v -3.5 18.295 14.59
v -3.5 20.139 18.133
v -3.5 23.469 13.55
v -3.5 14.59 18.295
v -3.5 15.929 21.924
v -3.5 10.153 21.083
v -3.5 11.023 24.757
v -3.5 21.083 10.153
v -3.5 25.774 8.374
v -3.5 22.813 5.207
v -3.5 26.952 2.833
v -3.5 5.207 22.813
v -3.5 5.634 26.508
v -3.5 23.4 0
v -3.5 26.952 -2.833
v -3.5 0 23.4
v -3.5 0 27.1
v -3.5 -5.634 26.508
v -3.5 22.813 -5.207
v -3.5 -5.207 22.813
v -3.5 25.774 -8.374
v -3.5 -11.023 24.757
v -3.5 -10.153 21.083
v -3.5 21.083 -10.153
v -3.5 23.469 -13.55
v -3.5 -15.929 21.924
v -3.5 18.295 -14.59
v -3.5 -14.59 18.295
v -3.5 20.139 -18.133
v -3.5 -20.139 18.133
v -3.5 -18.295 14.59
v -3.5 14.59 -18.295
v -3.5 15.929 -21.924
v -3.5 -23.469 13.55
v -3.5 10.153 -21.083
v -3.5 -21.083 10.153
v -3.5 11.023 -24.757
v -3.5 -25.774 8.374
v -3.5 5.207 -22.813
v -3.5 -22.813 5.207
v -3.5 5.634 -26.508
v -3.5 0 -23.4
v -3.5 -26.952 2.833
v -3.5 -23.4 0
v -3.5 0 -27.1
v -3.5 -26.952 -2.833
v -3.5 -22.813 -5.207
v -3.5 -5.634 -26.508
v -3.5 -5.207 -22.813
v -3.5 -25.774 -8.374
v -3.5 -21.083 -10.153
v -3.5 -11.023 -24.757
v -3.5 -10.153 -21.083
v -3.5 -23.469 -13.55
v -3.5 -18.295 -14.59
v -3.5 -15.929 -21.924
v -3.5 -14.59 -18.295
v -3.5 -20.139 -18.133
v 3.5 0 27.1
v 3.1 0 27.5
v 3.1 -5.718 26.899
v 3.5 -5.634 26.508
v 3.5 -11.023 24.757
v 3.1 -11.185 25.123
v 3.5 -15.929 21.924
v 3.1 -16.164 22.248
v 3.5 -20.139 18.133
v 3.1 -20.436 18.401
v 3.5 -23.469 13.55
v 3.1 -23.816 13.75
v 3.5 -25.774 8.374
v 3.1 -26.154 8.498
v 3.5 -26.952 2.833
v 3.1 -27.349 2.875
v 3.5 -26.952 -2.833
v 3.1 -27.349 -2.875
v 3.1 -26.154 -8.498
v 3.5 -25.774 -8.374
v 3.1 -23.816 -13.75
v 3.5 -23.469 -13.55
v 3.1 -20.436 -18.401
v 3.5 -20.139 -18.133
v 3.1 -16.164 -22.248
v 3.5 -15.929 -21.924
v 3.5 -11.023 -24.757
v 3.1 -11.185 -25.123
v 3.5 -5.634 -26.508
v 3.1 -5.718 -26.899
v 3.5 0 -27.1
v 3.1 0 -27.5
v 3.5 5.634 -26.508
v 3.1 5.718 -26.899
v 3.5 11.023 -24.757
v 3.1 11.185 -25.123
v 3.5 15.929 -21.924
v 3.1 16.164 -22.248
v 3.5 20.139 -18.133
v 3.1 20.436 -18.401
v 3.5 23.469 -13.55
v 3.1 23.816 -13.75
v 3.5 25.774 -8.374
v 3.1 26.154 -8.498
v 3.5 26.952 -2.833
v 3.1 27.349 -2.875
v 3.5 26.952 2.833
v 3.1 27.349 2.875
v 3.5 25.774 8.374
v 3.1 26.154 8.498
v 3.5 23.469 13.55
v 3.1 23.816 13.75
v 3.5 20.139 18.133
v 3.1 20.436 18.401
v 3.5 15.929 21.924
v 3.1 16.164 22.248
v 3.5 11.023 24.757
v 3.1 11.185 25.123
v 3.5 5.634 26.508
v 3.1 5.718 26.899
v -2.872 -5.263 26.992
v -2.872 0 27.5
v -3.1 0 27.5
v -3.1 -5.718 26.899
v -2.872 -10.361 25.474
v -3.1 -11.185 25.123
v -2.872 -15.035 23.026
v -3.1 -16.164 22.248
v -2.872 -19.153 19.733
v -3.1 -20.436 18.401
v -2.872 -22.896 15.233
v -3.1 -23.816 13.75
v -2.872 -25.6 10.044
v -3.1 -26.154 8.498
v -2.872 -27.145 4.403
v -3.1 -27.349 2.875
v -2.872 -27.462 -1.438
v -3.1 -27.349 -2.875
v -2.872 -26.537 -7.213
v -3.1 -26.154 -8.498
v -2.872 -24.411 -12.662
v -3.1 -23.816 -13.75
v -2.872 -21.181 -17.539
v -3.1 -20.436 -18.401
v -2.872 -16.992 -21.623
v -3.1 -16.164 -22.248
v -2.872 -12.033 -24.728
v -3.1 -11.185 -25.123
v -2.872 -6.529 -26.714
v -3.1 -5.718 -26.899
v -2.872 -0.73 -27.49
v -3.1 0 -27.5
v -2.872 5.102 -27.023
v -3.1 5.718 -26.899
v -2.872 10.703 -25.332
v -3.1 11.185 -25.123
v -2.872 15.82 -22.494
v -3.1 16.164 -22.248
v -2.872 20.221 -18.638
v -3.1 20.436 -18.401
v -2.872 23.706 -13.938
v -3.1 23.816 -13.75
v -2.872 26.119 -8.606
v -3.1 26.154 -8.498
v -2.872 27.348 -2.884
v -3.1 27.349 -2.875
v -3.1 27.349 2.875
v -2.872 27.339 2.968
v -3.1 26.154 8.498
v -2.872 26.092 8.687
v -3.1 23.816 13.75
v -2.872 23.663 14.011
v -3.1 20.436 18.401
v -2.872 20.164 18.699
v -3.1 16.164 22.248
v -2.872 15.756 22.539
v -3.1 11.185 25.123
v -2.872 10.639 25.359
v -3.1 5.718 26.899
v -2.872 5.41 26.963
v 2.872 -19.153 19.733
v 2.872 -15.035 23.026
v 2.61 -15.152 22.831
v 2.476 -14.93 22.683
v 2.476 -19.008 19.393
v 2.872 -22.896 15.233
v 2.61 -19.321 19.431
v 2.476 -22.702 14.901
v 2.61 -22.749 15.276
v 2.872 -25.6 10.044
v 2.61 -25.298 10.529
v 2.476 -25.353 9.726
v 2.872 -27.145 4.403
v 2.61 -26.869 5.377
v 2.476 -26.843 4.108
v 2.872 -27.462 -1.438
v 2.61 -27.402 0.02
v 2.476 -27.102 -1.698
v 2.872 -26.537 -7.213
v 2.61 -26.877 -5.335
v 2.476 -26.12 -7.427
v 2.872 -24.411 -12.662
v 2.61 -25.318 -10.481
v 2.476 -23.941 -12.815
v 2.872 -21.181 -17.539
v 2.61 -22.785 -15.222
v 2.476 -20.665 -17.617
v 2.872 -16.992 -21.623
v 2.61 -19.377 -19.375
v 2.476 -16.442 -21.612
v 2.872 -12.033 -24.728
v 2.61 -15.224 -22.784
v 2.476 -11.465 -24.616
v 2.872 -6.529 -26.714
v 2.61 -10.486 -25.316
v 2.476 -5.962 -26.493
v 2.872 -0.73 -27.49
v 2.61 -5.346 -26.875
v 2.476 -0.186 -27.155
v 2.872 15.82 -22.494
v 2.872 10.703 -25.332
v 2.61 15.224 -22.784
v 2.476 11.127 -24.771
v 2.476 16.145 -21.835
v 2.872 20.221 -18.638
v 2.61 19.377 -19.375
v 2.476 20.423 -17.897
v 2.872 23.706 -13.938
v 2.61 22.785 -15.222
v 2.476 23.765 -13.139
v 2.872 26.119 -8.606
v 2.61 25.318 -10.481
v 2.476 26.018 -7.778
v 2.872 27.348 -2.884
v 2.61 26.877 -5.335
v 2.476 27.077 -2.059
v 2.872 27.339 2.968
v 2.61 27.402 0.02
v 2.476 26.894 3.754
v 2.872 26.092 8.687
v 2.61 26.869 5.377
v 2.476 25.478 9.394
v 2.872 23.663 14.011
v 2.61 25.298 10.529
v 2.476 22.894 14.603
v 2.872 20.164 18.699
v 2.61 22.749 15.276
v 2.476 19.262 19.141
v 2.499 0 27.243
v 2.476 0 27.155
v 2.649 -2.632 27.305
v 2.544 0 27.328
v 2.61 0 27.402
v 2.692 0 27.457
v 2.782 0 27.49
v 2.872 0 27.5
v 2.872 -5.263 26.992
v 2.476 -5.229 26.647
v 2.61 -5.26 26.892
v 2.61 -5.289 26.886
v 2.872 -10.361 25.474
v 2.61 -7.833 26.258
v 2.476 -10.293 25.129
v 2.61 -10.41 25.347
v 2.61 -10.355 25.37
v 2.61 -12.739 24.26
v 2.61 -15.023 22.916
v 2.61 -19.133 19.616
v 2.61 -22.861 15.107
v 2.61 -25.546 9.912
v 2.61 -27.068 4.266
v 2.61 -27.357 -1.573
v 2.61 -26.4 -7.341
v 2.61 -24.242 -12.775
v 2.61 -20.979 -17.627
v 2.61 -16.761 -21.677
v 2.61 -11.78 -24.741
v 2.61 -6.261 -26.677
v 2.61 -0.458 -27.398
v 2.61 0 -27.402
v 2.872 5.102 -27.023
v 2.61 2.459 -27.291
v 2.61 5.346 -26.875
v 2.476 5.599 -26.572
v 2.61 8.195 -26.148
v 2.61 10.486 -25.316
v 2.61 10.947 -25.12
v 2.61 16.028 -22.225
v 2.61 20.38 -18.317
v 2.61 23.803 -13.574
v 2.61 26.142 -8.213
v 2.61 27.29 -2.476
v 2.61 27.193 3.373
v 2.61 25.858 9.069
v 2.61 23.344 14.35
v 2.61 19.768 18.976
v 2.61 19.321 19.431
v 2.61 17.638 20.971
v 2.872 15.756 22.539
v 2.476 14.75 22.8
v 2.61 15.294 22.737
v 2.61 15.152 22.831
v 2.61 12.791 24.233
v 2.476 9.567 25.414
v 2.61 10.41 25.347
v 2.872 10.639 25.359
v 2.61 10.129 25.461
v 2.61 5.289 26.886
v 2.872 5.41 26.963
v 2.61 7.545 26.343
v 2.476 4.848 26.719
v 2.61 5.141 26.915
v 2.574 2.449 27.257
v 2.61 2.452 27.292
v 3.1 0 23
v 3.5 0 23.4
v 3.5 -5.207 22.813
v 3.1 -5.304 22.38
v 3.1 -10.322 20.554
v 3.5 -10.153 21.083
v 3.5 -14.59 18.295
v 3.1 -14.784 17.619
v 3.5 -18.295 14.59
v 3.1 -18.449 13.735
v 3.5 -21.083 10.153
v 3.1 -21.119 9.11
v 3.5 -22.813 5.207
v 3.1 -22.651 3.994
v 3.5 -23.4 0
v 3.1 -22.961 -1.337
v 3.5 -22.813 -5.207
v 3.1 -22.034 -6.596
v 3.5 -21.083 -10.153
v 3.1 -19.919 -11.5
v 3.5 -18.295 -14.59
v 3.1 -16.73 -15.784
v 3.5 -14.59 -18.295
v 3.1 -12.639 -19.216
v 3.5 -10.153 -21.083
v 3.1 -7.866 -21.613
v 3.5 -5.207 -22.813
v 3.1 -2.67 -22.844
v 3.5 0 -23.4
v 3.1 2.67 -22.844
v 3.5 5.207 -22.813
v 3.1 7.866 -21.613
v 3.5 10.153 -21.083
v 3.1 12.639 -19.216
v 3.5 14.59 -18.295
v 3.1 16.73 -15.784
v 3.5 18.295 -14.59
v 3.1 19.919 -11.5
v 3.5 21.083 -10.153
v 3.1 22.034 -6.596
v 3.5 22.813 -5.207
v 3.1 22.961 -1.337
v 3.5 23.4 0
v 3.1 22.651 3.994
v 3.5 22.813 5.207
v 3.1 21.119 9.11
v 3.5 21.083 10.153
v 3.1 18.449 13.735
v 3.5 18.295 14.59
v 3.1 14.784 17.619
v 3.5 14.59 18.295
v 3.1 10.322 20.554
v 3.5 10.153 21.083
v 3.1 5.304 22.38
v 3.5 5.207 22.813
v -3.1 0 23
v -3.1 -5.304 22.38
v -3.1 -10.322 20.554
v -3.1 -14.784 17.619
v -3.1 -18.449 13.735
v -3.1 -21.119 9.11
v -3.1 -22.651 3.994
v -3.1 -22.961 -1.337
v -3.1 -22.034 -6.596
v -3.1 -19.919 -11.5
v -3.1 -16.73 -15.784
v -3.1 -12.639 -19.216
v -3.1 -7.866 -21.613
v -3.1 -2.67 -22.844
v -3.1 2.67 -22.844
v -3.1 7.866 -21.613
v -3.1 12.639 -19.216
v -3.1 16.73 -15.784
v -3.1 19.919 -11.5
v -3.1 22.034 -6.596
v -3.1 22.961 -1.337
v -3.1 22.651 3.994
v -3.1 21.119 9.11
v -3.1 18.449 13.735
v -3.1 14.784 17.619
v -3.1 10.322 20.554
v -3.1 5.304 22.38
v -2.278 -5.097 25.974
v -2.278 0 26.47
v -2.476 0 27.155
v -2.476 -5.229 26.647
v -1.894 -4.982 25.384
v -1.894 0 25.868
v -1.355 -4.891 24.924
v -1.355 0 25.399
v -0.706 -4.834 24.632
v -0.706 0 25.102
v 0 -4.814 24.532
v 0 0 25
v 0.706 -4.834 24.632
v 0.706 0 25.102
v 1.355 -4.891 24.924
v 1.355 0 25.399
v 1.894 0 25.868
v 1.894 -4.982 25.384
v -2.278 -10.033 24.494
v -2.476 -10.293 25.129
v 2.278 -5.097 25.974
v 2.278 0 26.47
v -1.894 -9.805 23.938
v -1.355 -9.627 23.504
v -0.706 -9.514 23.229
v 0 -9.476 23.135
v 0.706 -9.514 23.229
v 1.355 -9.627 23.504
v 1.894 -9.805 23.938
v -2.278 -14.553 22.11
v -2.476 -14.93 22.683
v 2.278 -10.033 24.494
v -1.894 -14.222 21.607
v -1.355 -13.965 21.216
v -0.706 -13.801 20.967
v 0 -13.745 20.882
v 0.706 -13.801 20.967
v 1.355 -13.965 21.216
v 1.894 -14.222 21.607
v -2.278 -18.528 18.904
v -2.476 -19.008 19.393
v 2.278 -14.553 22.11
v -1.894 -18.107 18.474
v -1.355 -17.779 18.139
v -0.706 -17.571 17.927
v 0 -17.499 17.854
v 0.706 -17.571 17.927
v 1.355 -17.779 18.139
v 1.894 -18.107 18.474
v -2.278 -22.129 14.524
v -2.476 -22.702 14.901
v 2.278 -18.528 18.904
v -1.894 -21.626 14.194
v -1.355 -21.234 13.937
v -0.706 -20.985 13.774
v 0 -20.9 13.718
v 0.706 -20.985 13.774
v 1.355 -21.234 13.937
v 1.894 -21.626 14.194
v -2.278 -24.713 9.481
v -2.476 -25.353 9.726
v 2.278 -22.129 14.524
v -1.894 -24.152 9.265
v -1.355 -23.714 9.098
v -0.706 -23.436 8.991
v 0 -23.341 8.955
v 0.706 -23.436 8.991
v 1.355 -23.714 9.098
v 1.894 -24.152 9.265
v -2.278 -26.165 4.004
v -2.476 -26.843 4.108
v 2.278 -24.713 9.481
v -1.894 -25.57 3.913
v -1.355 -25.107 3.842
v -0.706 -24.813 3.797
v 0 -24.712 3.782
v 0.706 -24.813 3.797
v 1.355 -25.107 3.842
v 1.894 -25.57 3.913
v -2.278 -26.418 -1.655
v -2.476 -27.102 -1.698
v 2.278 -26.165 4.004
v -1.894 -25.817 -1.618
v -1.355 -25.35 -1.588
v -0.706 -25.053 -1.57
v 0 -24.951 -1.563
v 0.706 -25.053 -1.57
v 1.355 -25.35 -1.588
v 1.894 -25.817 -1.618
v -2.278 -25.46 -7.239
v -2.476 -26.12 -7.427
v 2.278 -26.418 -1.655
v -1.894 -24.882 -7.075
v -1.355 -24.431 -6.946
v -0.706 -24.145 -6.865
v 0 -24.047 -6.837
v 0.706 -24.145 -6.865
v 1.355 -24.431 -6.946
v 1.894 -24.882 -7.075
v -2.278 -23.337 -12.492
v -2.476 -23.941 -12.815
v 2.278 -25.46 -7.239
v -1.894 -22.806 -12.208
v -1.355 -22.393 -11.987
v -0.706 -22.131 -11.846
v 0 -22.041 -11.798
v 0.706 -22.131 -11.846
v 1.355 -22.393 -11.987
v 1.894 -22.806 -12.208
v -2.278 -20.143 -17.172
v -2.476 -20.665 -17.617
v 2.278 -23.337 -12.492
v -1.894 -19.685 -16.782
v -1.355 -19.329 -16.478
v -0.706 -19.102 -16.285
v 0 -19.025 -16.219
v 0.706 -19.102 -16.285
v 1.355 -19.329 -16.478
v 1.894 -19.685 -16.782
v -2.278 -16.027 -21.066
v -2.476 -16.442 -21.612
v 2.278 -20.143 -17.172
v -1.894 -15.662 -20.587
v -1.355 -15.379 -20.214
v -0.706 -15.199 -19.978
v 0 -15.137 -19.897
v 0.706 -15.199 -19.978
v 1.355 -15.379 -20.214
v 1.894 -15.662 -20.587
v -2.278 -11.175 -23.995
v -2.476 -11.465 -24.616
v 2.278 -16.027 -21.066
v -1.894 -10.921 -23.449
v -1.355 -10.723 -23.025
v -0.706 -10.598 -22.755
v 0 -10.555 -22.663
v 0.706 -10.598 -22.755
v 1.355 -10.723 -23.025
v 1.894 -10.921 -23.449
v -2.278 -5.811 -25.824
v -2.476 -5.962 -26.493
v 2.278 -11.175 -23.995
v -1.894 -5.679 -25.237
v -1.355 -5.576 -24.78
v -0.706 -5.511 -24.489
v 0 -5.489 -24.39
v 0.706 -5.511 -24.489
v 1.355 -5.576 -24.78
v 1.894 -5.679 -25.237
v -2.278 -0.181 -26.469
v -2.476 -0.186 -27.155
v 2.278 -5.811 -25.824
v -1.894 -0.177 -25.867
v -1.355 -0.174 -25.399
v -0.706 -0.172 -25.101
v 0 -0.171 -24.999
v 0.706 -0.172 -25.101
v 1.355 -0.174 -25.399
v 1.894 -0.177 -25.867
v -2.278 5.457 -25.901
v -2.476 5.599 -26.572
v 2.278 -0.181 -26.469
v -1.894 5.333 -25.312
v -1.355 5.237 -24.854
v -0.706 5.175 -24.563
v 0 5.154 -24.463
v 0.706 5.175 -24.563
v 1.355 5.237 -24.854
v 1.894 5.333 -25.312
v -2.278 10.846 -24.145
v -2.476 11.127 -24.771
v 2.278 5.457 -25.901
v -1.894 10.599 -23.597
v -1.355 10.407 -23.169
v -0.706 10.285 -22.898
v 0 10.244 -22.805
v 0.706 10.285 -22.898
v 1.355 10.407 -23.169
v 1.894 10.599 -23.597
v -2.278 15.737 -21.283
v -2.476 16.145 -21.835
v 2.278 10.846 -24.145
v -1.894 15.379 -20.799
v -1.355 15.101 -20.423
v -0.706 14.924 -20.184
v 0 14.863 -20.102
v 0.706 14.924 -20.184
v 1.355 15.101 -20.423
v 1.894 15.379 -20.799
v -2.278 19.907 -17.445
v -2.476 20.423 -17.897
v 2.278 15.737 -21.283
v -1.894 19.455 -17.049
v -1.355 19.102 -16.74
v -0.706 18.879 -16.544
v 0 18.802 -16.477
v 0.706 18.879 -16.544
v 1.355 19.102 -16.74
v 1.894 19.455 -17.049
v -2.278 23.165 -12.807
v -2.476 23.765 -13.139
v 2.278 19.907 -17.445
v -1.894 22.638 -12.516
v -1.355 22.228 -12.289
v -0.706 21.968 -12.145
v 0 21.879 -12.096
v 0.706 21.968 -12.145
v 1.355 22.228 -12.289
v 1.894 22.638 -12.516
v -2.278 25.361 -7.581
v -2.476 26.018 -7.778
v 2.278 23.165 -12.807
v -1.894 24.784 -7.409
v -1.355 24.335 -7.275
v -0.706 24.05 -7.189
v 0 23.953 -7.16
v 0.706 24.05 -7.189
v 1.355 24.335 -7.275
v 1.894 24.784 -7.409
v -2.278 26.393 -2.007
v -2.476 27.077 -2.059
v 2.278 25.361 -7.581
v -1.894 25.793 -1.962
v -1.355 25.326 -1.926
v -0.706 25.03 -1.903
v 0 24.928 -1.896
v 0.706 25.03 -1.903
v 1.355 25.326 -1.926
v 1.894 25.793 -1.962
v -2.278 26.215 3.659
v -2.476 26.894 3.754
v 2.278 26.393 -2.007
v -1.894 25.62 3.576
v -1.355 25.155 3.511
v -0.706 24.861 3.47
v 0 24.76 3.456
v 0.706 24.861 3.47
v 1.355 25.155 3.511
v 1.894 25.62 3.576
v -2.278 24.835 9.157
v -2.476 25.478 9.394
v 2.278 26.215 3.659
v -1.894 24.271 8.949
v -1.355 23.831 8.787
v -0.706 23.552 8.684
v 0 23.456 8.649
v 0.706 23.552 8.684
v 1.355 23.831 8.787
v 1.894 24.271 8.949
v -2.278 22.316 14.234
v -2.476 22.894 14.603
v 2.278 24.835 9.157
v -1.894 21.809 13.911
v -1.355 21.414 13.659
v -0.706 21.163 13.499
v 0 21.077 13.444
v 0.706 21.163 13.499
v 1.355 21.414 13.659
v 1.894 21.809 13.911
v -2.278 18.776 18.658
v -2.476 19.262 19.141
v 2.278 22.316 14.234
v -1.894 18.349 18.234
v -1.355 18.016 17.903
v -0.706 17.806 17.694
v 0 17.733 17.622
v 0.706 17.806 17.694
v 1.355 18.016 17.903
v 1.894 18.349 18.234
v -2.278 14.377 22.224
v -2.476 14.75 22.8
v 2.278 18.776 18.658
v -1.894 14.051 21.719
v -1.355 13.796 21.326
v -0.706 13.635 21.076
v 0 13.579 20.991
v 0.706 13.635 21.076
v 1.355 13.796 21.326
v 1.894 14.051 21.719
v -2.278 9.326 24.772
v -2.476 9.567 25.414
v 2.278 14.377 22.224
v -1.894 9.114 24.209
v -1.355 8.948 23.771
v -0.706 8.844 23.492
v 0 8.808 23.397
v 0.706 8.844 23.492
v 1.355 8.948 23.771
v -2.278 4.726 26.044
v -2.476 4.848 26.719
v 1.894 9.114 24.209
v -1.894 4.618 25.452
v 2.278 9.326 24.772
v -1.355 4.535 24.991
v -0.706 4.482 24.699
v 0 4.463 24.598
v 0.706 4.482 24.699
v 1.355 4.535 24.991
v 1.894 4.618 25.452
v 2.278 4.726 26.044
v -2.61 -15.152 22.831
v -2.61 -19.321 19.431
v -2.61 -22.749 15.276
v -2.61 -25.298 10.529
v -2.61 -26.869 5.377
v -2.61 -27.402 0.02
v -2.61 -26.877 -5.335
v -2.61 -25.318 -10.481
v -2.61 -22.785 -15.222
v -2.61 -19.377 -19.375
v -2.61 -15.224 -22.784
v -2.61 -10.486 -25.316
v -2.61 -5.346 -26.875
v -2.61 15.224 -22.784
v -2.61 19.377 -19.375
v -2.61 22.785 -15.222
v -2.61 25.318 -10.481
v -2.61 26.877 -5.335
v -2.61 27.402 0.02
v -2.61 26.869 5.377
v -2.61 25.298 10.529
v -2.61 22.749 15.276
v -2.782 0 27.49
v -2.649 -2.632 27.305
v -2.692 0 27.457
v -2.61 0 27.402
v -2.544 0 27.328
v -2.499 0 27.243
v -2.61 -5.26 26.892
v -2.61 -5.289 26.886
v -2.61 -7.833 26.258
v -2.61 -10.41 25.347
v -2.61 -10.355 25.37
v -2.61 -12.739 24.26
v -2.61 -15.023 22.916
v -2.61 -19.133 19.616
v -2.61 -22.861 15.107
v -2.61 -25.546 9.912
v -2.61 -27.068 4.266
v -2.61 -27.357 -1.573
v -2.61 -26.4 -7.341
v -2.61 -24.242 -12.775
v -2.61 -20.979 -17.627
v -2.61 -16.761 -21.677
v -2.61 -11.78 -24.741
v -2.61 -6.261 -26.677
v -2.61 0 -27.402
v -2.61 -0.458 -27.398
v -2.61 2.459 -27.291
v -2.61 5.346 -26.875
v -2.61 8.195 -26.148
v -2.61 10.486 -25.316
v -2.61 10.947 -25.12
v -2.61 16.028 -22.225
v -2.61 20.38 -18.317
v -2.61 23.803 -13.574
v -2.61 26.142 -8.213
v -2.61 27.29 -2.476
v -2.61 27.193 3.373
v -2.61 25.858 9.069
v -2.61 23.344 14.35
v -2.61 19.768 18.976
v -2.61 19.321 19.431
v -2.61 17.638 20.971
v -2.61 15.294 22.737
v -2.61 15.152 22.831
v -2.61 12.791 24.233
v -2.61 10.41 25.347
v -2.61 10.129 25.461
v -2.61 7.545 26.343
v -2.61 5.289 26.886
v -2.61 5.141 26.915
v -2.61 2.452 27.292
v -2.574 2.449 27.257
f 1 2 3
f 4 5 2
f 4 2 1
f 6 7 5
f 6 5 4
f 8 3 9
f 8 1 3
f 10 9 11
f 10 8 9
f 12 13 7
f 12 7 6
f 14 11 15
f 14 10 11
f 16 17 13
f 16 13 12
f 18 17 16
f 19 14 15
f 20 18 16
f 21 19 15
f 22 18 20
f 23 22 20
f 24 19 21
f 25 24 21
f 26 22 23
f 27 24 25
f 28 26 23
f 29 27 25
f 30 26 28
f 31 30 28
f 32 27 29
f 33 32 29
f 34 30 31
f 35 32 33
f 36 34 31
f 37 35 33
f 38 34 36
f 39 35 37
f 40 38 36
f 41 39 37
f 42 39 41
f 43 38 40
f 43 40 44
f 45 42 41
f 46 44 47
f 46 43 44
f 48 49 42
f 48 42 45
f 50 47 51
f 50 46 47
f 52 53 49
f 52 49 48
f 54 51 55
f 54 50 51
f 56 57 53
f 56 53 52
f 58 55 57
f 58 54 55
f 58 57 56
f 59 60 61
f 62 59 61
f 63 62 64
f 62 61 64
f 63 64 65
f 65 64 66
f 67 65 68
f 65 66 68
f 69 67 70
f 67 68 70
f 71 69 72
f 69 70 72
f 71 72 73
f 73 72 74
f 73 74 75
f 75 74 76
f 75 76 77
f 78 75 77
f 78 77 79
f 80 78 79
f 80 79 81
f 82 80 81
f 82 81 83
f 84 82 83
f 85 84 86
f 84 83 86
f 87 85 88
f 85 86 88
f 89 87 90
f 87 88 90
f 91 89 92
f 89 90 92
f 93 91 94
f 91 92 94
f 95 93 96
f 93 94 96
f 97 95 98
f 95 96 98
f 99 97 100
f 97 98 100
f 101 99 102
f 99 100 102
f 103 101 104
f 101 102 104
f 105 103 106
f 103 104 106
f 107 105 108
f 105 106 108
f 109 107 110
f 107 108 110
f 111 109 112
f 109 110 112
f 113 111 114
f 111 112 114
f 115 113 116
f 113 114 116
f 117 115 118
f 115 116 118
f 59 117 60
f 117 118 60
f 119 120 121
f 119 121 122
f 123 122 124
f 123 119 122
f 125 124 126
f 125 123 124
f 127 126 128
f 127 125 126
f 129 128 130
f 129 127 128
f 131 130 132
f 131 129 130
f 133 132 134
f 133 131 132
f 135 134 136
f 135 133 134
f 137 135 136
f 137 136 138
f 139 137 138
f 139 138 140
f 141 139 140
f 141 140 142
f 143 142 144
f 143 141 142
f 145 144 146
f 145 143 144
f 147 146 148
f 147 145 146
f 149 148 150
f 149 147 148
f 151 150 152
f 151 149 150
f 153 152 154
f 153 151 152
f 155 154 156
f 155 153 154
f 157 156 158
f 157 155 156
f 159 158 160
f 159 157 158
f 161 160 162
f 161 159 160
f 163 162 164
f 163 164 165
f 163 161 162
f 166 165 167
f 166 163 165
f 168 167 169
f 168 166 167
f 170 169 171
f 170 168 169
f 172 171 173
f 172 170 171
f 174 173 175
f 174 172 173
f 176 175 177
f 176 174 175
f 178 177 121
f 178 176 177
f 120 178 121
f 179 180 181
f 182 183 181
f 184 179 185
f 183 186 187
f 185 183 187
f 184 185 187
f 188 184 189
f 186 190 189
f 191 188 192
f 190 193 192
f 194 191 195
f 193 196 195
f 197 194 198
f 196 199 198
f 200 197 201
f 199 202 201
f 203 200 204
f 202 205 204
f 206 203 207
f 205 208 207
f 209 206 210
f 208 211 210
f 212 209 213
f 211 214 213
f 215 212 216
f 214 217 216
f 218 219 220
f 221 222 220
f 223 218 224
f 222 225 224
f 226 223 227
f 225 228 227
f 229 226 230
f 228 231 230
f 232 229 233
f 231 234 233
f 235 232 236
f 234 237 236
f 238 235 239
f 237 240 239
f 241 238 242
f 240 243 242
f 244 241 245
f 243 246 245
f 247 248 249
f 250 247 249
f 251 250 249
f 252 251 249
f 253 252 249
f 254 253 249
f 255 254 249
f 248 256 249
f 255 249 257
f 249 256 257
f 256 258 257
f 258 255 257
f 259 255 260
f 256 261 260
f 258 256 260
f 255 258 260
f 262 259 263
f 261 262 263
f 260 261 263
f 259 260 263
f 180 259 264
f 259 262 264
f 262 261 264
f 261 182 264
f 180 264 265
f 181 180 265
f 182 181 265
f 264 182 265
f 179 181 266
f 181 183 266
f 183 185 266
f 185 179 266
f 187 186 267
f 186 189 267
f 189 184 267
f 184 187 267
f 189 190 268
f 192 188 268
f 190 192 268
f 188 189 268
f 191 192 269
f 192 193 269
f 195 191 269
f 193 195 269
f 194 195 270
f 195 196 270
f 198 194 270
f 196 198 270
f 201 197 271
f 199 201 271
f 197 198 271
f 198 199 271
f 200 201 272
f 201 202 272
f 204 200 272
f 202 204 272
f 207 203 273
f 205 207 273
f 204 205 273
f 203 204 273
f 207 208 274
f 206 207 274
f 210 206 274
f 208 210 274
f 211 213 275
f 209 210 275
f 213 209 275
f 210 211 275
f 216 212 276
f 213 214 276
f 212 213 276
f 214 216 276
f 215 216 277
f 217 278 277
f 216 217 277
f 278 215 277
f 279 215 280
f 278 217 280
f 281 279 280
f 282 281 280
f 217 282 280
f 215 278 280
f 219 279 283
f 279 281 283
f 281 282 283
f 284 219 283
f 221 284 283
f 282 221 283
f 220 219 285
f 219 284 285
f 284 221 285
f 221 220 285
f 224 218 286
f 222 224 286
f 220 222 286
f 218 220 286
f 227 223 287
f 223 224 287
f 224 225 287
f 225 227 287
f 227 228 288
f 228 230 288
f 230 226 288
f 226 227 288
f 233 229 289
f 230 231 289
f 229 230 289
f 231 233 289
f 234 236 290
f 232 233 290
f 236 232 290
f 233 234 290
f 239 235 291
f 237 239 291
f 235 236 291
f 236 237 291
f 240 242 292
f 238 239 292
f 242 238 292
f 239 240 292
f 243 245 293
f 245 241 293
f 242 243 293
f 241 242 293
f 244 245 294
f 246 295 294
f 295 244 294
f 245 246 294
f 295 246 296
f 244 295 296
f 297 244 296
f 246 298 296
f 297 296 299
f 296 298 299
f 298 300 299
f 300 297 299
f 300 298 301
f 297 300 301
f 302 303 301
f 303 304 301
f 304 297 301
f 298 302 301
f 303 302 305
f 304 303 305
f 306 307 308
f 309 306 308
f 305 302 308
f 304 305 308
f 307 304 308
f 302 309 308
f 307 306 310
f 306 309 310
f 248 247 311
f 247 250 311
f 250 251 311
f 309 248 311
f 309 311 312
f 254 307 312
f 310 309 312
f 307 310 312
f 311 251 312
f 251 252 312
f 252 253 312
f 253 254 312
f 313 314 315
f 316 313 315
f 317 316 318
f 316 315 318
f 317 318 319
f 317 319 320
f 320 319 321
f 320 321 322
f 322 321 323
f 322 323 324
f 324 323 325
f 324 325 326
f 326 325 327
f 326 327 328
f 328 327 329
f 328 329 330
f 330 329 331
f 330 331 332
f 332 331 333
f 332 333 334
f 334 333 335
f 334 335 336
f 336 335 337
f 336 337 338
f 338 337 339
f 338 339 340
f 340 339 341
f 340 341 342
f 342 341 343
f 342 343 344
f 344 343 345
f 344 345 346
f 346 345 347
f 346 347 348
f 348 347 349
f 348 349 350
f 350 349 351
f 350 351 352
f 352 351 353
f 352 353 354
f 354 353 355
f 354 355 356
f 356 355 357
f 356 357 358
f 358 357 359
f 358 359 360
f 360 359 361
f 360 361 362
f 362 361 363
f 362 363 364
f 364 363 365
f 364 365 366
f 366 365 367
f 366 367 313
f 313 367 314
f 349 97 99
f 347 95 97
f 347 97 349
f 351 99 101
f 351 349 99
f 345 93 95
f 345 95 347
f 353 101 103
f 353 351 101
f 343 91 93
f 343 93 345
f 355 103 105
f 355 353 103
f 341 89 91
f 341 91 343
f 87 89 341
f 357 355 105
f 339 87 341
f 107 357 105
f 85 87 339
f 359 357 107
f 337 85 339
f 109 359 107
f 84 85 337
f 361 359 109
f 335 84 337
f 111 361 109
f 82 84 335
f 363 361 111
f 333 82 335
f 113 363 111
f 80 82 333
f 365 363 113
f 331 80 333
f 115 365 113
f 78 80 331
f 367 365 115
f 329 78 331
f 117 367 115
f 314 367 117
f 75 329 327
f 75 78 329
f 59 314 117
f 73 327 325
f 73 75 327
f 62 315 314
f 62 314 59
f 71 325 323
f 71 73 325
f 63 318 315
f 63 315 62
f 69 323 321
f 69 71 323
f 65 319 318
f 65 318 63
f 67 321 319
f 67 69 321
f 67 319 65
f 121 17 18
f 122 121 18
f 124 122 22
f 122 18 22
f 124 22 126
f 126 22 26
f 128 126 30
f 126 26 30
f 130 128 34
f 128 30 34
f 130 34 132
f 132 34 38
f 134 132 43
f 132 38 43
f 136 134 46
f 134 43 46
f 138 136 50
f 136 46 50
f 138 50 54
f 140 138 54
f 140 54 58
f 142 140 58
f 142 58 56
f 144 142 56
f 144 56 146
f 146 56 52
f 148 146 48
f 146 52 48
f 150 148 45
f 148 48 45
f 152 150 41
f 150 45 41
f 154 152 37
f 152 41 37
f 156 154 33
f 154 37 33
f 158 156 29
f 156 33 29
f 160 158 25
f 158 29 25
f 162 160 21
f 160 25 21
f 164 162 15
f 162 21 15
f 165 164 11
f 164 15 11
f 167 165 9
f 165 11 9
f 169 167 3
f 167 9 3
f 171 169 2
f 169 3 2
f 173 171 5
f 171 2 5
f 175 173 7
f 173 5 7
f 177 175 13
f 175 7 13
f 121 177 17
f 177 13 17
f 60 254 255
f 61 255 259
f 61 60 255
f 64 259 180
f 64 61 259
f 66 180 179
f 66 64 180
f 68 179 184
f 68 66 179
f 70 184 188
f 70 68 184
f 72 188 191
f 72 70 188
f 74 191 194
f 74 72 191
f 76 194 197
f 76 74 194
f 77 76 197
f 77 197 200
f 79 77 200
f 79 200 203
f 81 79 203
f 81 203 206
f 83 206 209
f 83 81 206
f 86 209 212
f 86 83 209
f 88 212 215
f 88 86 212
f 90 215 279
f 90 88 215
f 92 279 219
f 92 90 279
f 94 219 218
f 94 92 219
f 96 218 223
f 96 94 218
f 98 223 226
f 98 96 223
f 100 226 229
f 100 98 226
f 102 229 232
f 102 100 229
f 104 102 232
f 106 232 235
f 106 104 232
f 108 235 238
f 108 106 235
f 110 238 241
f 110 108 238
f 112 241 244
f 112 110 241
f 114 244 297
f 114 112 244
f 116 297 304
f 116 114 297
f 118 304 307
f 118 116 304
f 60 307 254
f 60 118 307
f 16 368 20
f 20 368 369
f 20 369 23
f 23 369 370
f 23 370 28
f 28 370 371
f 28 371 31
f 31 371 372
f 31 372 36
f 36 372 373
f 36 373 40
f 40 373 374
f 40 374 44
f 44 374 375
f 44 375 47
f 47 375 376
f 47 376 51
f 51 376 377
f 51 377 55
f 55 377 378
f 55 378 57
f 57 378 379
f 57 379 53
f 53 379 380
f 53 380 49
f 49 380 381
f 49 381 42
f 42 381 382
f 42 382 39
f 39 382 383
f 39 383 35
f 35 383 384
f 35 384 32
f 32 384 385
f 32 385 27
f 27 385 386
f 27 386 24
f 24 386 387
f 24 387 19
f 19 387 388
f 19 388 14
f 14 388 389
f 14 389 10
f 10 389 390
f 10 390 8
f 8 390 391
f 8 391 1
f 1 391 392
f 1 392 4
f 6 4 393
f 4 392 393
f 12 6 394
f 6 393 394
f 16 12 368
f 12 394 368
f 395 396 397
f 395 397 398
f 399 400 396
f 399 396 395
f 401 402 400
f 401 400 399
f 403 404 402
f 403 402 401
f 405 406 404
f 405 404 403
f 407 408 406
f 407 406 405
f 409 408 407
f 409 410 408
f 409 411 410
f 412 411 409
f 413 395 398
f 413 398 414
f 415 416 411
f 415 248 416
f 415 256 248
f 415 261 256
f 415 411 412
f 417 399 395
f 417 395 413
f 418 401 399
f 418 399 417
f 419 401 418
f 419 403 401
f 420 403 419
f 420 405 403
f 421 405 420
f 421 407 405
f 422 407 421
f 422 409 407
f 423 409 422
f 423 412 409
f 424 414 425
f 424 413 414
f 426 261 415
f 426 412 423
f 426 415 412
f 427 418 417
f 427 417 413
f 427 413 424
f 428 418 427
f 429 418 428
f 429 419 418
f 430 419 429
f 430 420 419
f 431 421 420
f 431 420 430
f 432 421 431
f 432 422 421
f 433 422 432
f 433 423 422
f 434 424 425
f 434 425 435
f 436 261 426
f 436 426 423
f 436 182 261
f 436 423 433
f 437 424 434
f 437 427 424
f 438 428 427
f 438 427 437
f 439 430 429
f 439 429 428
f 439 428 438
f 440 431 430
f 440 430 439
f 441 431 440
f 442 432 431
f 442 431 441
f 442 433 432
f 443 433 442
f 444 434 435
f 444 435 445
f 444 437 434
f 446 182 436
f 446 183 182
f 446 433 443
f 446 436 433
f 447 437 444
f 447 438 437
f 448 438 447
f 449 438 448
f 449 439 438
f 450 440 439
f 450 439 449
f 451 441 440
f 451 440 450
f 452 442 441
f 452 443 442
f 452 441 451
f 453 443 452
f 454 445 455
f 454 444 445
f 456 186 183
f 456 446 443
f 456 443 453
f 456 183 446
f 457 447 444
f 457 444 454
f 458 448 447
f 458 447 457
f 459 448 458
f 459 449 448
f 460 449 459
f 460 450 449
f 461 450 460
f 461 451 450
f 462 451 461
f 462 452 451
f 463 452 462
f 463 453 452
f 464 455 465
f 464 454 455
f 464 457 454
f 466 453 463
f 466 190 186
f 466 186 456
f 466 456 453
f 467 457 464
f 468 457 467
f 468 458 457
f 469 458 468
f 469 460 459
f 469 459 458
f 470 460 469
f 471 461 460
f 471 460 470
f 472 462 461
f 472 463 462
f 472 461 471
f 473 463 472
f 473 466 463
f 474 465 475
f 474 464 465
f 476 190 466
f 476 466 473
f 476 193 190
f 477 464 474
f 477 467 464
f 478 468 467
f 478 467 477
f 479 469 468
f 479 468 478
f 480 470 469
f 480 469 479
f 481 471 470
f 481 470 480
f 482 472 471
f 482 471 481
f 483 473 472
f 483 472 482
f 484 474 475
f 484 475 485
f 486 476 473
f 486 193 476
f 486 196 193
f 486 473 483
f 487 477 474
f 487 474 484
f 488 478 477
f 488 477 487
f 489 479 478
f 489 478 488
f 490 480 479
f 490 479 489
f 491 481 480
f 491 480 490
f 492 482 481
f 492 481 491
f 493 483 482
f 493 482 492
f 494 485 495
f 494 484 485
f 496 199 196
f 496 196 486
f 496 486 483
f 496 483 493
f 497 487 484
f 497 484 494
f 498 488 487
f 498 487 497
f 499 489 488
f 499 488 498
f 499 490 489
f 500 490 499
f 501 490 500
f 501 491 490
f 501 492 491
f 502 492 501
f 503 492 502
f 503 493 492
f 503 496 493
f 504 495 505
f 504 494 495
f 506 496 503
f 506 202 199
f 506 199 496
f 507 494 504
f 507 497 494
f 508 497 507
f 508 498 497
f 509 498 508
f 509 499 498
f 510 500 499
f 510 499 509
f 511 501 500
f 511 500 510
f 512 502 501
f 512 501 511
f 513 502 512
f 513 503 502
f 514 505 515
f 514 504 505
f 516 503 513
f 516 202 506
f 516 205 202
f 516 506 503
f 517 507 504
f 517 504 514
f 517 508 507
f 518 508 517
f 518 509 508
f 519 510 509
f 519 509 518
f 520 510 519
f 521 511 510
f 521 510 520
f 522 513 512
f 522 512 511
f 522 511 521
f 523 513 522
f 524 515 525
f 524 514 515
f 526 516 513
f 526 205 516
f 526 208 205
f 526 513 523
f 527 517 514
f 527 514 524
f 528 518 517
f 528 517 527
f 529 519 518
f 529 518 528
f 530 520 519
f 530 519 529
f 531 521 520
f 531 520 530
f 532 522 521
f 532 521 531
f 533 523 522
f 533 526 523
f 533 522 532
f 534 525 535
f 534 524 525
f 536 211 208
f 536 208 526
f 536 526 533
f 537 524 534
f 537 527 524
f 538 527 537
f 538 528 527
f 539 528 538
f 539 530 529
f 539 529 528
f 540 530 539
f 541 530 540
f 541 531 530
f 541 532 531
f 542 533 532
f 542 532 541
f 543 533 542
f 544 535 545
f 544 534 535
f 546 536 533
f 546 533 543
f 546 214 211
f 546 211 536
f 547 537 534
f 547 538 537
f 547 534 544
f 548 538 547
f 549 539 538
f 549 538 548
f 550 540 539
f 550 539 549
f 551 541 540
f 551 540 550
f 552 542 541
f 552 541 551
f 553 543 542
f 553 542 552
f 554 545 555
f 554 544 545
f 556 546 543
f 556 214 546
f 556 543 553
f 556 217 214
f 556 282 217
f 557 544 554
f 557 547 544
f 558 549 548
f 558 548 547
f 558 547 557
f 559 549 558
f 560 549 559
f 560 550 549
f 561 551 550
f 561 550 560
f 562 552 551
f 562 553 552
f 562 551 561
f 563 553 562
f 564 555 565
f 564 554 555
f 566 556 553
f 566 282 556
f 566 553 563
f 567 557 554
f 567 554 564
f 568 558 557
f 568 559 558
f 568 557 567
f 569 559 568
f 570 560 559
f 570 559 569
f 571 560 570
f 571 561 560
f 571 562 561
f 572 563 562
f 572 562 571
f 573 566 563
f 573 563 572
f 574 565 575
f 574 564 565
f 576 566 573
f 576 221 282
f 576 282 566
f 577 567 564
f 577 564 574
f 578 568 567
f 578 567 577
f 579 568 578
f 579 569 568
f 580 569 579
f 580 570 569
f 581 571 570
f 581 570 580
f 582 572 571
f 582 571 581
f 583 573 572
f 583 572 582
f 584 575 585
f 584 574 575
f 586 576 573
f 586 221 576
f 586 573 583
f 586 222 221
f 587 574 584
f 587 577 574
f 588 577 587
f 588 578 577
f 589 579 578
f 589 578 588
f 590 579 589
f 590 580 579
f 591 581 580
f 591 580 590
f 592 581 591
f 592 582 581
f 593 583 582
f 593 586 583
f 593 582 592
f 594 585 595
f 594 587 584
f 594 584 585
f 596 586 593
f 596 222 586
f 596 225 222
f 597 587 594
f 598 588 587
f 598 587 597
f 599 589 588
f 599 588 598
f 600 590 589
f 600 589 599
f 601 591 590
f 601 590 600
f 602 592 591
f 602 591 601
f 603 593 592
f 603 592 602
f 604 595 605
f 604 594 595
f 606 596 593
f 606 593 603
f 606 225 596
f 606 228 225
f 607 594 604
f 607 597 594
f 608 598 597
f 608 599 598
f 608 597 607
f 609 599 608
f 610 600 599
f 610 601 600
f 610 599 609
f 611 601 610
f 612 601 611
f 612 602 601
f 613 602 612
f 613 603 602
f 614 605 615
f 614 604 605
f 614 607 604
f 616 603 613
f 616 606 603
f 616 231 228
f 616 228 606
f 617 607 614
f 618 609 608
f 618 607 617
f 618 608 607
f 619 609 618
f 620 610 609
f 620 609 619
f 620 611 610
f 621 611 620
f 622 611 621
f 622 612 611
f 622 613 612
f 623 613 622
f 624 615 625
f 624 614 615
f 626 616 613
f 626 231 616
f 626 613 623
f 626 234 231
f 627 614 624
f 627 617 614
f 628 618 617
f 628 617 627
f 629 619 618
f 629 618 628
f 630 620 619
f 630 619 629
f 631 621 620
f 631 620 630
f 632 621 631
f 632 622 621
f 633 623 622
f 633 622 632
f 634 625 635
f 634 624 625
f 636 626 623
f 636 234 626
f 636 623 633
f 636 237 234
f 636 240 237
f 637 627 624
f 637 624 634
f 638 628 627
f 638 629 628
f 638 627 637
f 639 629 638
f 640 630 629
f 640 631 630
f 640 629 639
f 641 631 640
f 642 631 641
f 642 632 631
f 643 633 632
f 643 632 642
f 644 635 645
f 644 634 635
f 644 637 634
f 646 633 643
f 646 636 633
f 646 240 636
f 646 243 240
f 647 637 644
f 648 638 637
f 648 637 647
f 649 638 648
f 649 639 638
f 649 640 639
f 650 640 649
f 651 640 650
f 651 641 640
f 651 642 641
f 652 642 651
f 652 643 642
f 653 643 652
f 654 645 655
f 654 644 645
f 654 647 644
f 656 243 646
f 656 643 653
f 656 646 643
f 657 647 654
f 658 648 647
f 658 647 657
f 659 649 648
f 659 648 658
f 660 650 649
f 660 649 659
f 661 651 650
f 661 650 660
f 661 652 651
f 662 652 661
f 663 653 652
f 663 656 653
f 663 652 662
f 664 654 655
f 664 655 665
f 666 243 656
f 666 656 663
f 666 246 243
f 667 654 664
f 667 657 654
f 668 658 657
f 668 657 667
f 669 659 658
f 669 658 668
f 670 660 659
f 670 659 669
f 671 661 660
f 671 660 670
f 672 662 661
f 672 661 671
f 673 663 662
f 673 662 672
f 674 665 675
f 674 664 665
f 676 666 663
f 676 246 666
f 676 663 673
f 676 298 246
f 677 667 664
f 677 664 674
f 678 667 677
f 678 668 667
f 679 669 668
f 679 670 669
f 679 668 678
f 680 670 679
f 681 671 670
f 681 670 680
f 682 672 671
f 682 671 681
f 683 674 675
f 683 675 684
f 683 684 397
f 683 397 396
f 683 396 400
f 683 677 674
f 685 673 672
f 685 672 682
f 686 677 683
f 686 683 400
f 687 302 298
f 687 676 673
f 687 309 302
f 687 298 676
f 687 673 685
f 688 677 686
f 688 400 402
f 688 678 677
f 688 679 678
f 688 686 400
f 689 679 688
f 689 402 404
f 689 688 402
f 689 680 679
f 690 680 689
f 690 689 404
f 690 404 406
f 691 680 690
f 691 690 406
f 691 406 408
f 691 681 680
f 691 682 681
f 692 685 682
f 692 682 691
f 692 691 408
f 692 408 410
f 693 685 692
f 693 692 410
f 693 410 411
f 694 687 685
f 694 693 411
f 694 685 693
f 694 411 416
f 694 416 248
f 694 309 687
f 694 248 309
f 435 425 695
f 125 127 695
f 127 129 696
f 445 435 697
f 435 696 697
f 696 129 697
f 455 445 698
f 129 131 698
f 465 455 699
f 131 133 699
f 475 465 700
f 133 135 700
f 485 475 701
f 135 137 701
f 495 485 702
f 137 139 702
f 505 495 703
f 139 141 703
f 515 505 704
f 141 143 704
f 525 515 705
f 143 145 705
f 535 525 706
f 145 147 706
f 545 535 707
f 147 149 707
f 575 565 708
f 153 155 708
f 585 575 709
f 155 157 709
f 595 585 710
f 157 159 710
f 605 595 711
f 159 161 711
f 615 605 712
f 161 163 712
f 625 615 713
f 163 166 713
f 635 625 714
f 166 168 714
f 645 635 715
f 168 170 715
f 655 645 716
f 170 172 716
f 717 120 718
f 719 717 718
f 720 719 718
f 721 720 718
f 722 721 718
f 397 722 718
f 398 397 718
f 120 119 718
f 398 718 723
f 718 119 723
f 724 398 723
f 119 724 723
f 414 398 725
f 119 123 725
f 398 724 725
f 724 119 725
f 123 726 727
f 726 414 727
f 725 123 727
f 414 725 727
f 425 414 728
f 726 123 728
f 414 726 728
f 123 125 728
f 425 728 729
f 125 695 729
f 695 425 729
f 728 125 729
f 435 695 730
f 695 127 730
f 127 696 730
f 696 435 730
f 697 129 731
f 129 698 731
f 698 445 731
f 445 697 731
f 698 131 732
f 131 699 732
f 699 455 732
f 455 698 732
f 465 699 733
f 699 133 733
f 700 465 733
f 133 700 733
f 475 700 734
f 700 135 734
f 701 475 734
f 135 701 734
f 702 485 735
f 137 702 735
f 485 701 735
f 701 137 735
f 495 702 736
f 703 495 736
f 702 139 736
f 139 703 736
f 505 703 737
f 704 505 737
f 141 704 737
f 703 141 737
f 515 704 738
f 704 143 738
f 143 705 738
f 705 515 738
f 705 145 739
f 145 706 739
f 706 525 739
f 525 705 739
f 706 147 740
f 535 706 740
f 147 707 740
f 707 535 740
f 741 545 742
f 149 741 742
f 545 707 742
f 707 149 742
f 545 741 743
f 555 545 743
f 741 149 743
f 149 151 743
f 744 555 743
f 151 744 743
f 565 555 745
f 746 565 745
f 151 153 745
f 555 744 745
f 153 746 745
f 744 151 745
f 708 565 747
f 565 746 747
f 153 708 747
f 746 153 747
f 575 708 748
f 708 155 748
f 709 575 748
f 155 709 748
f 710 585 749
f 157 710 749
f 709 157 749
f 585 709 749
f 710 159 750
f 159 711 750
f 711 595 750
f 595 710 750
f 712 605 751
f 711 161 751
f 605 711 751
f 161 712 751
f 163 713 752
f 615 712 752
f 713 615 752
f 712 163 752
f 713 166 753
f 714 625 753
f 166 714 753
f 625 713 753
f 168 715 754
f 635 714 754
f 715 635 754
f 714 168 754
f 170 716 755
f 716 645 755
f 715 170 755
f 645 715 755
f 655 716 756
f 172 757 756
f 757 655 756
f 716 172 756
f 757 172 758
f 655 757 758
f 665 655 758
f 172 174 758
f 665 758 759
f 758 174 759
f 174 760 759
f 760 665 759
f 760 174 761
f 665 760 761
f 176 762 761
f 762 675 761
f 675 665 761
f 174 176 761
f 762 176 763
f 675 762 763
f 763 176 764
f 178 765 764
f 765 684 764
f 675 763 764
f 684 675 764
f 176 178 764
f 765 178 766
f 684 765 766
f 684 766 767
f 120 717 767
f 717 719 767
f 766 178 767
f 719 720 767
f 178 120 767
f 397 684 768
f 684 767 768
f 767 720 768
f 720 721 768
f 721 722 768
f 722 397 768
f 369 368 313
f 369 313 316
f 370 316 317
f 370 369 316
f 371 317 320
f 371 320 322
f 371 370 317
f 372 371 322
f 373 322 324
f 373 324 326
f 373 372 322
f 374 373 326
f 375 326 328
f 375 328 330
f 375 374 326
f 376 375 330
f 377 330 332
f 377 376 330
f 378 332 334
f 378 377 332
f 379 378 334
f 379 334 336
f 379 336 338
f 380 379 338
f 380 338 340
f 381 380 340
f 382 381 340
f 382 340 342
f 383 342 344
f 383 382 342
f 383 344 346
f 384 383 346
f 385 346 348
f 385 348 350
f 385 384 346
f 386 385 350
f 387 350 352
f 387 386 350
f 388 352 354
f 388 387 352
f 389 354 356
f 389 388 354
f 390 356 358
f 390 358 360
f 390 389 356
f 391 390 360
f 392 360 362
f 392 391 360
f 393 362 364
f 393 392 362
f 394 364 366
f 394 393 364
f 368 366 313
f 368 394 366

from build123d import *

# Parameters (mm, degrees)
FILLET_1_R     = 0.4
CHAMFER_1_SIZE = 0.4


with BuildPart() as part:
    # 草图1 → 旋转1 (revolve)
    with BuildSketch(Plane.XY, mode=Mode.PRIVATE) as revolve_1_sk:
        with BuildLine():
            Line((3.5, 23), (0, 23))
            Line((0, 23), (-3.5, 23))
            Line((-3.5, 23), (-3.5, 27.5))
            Line((-3.5, 27.5), (-2.5, 27.5))
            ThreePointArc((-2.5, 27.5), (0, 25), (2.5, 27.5))
            Line((2.5, 27.5), (3.5, 27.5))
            Line((3.5, 27.5), (3.5, 23))
        make_face()
    revolve(revolve_1_sk.sketch.rotate(Axis((-16.580648815, 0, 0), (1, 0, 0)), 90), axis=Axis((-16.580648815, 0, 0), (1, 0, 0)))

    # 圆角1
    fillet_1_edges = [part.edges().sort_by_distance(p)[0] for p in [
        (2.5, 0, -27.5),
        (-2.5, 0, -27.5),
    ]]
    fillet(fillet_1_edges, radius=FILLET_1_R)

    # 倒角1
    chamfer_1_edges = [part.edges().sort_by_distance(p)[0] for p in [
        (3.5, 0, -27.5),
        (3.5, 0, -23),
        (-3.5, 0, -23),
        (-3.5, 0, -27.5),
    ]]
    chamfer(chamfer_1_edges, length=CHAMFER_1_SIZE)


solid = part.part
